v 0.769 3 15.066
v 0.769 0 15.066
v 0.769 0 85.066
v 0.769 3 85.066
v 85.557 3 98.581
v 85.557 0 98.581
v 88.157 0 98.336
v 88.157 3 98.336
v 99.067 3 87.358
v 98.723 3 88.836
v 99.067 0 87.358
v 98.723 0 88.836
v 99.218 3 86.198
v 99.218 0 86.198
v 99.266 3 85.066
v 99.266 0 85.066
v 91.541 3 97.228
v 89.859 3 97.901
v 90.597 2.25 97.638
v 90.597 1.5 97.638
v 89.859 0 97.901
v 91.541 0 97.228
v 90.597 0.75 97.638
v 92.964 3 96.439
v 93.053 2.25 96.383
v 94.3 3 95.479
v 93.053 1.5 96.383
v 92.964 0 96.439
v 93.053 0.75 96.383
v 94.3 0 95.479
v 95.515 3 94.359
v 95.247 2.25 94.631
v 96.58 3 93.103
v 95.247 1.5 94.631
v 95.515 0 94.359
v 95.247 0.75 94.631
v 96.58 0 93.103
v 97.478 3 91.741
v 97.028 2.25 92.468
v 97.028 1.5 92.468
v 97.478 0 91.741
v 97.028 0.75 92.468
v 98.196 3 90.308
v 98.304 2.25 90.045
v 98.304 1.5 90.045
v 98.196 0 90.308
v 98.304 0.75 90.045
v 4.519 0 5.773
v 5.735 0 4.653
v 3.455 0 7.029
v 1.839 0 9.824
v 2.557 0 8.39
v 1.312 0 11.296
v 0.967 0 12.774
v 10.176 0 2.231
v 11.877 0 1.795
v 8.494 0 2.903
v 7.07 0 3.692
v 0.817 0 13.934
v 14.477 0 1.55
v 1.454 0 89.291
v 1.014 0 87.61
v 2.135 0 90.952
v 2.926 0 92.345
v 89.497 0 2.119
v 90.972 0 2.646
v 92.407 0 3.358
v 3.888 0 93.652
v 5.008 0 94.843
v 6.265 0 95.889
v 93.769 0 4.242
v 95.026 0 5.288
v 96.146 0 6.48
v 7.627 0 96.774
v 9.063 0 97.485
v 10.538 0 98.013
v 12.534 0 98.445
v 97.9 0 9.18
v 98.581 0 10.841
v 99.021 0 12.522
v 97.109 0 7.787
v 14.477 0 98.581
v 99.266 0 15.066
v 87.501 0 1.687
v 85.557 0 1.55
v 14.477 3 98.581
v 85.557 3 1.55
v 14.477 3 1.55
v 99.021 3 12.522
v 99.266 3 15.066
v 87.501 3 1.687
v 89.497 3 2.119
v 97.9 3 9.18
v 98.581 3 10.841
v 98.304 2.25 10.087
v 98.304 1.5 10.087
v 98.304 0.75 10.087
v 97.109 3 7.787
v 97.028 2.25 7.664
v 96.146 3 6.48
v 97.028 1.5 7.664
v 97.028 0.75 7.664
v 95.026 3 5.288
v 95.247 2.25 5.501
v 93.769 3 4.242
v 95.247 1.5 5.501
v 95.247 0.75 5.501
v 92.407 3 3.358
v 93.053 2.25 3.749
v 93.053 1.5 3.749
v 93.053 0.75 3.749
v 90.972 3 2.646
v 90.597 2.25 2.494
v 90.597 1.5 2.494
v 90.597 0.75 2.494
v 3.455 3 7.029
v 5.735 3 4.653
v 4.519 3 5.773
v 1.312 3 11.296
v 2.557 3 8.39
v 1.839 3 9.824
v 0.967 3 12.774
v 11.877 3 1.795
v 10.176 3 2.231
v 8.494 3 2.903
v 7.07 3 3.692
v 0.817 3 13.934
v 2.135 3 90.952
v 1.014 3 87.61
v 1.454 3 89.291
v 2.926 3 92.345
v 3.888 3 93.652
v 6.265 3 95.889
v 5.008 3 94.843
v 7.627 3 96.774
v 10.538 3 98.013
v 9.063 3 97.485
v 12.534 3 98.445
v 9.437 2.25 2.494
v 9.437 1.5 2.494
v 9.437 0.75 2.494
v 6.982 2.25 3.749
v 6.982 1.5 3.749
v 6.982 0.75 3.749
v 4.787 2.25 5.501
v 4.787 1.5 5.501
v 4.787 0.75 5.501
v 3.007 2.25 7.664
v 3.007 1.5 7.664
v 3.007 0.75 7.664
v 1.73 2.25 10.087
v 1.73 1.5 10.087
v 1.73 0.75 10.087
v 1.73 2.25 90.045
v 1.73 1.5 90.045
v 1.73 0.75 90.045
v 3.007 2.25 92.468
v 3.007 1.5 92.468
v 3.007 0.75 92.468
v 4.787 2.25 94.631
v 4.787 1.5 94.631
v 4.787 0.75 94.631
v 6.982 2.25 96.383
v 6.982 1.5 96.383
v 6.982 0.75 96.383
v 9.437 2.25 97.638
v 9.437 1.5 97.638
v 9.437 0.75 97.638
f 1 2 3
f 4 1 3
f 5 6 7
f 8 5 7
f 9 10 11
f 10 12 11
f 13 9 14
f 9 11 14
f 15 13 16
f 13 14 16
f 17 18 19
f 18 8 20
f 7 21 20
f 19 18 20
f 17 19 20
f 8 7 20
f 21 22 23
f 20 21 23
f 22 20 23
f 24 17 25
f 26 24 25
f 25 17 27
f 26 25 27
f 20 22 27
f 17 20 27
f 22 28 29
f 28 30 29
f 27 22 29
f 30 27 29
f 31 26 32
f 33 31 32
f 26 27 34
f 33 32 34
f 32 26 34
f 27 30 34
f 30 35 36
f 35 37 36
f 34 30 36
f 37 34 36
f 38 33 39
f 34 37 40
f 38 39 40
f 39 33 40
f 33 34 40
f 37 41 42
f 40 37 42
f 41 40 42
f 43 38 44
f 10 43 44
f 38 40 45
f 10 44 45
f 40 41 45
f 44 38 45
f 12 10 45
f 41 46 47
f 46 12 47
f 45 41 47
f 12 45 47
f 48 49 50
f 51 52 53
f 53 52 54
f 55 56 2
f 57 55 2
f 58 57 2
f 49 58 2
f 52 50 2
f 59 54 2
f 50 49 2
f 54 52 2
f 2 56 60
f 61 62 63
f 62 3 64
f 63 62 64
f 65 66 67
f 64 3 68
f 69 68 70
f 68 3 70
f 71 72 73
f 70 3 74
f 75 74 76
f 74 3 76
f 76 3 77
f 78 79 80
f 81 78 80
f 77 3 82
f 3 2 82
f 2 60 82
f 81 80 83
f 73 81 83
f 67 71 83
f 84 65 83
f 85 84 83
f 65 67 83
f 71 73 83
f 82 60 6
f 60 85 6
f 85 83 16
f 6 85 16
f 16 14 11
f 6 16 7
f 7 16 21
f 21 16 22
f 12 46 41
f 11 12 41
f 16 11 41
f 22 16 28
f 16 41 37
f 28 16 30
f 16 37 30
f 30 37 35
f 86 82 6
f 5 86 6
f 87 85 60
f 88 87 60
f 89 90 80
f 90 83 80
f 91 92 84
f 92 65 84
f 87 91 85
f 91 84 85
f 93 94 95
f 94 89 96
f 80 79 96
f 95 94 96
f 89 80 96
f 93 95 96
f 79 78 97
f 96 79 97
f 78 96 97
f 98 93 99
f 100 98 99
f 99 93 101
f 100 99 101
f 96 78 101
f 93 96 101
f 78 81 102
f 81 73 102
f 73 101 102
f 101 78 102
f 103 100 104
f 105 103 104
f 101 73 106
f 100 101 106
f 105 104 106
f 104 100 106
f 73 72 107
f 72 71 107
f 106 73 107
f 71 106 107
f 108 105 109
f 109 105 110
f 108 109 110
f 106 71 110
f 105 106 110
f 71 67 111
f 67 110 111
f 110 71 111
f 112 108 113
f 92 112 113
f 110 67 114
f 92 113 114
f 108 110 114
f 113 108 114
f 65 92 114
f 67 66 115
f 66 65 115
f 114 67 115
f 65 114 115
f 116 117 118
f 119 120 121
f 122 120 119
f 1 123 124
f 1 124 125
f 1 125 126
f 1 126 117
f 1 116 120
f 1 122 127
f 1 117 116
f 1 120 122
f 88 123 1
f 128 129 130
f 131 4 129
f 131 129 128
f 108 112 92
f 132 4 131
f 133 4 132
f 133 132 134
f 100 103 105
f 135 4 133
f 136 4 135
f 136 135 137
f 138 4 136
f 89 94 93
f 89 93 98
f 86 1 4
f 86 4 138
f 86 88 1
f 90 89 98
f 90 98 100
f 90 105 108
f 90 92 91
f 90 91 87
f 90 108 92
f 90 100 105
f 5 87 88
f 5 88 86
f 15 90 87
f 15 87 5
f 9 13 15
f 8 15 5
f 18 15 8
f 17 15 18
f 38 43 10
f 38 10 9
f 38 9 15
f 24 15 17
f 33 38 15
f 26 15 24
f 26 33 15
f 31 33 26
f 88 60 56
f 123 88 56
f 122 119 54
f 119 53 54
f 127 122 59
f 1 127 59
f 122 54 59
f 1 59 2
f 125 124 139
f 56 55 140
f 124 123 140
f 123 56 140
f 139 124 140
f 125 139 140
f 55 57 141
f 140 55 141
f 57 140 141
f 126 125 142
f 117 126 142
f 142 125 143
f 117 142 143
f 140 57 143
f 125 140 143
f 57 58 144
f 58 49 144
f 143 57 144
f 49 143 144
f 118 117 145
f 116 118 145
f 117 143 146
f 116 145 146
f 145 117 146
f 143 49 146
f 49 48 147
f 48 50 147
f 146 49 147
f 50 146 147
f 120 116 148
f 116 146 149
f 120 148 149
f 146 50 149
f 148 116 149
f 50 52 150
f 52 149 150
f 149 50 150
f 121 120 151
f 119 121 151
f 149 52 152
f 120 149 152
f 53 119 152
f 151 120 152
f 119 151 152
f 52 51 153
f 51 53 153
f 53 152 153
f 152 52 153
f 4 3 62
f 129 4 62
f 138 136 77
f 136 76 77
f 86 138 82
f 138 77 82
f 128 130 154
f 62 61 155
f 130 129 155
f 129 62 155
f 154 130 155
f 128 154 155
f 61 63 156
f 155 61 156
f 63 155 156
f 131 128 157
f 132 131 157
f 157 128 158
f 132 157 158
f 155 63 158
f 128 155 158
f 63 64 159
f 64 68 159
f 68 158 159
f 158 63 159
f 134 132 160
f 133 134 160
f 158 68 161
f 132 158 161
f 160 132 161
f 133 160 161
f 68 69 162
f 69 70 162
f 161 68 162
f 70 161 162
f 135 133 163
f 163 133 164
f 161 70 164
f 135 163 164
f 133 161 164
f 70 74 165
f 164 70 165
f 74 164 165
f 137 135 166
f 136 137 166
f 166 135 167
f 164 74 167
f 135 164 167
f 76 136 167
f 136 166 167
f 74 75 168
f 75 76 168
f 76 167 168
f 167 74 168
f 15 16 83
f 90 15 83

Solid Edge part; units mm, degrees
sketch "Sketch1" plane through (0, 0, 0) normal (0, -1, 0) x (1, 0, 0)
  line L0 (14.4774, 98.5813) -> (85.5572, 98.5813)
  spline S0 degree 3 poles (85.5572, 98.5813) (87.1691, 98.5837) (88.9096, 98.2942) (92.2853, 96.9811) (93.9072, 95.9503) (96.5874, 93.3109) (97.636, 91.7115) (98.9728, 88.3787) (99.2679, 86.6587) (99.2655, 85.0659) knots 0 0 0 0 0.25 0.25 0.5 0.5 0.75 0.75 1 1 1 1
  line L1 (99.2655, 85.0659) -> (99.2655, 15.0659)
  spline S1 degree 3 poles (99.2655, 15.0659) (99.2679, 13.4731) (98.9728, 11.7531) (97.636, 8.4203) (96.5874, 6.8209) (93.9072, 4.1815) (92.2853, 3.1507) (88.9096, 1.8376) (87.1691, 1.5481) (85.5572, 1.5505) knots 0 0 0 0 0.25 0.25 0.5 0.5 0.75 0.75 1 1 1 1
  line L2 (85.5572, 1.5505) -> (14.4774, 1.5505)
  spline S2 degree 3 poles (14.4774, 1.5505) (12.8655, 1.5481) (11.125, 1.8376) (7.7493, 3.1507) (6.1274, 4.1815) (3.4472, 6.8209) (2.3985, 8.4203) (1.0618, 11.7531) (0.7667, 13.4731) (0.7691, 15.0659) knots 0 0 0 0 0.25 0.25 0.5 0.5 0.75 0.75 1 1 1 1
  line L3 (0.7691, 15.0659) -> (0.7691, 85.0659)
  spline S3 degree 3 poles (0.7691, 85.0659) (0.7667, 86.6587) (1.0618, 88.3787) (2.3985, 91.7115) (3.4472, 93.3109) (6.1274, 95.9503) (7.7493, 96.9811) (11.125, 98.2942) (12.8655, 98.5837) (14.4774, 98.5813) knots 0 0 0 0 0.25 0.25 0.5 0.5 0.75 0.75 1 1 1 1
  dimension "D1" = 48.2691
  dimension "D2" = 70
  dimension "D3" = 70
extrude "Protrusion1" add sketch "Sketch1" against normal blind 3
properties material "ABS Plastic, high impact"
